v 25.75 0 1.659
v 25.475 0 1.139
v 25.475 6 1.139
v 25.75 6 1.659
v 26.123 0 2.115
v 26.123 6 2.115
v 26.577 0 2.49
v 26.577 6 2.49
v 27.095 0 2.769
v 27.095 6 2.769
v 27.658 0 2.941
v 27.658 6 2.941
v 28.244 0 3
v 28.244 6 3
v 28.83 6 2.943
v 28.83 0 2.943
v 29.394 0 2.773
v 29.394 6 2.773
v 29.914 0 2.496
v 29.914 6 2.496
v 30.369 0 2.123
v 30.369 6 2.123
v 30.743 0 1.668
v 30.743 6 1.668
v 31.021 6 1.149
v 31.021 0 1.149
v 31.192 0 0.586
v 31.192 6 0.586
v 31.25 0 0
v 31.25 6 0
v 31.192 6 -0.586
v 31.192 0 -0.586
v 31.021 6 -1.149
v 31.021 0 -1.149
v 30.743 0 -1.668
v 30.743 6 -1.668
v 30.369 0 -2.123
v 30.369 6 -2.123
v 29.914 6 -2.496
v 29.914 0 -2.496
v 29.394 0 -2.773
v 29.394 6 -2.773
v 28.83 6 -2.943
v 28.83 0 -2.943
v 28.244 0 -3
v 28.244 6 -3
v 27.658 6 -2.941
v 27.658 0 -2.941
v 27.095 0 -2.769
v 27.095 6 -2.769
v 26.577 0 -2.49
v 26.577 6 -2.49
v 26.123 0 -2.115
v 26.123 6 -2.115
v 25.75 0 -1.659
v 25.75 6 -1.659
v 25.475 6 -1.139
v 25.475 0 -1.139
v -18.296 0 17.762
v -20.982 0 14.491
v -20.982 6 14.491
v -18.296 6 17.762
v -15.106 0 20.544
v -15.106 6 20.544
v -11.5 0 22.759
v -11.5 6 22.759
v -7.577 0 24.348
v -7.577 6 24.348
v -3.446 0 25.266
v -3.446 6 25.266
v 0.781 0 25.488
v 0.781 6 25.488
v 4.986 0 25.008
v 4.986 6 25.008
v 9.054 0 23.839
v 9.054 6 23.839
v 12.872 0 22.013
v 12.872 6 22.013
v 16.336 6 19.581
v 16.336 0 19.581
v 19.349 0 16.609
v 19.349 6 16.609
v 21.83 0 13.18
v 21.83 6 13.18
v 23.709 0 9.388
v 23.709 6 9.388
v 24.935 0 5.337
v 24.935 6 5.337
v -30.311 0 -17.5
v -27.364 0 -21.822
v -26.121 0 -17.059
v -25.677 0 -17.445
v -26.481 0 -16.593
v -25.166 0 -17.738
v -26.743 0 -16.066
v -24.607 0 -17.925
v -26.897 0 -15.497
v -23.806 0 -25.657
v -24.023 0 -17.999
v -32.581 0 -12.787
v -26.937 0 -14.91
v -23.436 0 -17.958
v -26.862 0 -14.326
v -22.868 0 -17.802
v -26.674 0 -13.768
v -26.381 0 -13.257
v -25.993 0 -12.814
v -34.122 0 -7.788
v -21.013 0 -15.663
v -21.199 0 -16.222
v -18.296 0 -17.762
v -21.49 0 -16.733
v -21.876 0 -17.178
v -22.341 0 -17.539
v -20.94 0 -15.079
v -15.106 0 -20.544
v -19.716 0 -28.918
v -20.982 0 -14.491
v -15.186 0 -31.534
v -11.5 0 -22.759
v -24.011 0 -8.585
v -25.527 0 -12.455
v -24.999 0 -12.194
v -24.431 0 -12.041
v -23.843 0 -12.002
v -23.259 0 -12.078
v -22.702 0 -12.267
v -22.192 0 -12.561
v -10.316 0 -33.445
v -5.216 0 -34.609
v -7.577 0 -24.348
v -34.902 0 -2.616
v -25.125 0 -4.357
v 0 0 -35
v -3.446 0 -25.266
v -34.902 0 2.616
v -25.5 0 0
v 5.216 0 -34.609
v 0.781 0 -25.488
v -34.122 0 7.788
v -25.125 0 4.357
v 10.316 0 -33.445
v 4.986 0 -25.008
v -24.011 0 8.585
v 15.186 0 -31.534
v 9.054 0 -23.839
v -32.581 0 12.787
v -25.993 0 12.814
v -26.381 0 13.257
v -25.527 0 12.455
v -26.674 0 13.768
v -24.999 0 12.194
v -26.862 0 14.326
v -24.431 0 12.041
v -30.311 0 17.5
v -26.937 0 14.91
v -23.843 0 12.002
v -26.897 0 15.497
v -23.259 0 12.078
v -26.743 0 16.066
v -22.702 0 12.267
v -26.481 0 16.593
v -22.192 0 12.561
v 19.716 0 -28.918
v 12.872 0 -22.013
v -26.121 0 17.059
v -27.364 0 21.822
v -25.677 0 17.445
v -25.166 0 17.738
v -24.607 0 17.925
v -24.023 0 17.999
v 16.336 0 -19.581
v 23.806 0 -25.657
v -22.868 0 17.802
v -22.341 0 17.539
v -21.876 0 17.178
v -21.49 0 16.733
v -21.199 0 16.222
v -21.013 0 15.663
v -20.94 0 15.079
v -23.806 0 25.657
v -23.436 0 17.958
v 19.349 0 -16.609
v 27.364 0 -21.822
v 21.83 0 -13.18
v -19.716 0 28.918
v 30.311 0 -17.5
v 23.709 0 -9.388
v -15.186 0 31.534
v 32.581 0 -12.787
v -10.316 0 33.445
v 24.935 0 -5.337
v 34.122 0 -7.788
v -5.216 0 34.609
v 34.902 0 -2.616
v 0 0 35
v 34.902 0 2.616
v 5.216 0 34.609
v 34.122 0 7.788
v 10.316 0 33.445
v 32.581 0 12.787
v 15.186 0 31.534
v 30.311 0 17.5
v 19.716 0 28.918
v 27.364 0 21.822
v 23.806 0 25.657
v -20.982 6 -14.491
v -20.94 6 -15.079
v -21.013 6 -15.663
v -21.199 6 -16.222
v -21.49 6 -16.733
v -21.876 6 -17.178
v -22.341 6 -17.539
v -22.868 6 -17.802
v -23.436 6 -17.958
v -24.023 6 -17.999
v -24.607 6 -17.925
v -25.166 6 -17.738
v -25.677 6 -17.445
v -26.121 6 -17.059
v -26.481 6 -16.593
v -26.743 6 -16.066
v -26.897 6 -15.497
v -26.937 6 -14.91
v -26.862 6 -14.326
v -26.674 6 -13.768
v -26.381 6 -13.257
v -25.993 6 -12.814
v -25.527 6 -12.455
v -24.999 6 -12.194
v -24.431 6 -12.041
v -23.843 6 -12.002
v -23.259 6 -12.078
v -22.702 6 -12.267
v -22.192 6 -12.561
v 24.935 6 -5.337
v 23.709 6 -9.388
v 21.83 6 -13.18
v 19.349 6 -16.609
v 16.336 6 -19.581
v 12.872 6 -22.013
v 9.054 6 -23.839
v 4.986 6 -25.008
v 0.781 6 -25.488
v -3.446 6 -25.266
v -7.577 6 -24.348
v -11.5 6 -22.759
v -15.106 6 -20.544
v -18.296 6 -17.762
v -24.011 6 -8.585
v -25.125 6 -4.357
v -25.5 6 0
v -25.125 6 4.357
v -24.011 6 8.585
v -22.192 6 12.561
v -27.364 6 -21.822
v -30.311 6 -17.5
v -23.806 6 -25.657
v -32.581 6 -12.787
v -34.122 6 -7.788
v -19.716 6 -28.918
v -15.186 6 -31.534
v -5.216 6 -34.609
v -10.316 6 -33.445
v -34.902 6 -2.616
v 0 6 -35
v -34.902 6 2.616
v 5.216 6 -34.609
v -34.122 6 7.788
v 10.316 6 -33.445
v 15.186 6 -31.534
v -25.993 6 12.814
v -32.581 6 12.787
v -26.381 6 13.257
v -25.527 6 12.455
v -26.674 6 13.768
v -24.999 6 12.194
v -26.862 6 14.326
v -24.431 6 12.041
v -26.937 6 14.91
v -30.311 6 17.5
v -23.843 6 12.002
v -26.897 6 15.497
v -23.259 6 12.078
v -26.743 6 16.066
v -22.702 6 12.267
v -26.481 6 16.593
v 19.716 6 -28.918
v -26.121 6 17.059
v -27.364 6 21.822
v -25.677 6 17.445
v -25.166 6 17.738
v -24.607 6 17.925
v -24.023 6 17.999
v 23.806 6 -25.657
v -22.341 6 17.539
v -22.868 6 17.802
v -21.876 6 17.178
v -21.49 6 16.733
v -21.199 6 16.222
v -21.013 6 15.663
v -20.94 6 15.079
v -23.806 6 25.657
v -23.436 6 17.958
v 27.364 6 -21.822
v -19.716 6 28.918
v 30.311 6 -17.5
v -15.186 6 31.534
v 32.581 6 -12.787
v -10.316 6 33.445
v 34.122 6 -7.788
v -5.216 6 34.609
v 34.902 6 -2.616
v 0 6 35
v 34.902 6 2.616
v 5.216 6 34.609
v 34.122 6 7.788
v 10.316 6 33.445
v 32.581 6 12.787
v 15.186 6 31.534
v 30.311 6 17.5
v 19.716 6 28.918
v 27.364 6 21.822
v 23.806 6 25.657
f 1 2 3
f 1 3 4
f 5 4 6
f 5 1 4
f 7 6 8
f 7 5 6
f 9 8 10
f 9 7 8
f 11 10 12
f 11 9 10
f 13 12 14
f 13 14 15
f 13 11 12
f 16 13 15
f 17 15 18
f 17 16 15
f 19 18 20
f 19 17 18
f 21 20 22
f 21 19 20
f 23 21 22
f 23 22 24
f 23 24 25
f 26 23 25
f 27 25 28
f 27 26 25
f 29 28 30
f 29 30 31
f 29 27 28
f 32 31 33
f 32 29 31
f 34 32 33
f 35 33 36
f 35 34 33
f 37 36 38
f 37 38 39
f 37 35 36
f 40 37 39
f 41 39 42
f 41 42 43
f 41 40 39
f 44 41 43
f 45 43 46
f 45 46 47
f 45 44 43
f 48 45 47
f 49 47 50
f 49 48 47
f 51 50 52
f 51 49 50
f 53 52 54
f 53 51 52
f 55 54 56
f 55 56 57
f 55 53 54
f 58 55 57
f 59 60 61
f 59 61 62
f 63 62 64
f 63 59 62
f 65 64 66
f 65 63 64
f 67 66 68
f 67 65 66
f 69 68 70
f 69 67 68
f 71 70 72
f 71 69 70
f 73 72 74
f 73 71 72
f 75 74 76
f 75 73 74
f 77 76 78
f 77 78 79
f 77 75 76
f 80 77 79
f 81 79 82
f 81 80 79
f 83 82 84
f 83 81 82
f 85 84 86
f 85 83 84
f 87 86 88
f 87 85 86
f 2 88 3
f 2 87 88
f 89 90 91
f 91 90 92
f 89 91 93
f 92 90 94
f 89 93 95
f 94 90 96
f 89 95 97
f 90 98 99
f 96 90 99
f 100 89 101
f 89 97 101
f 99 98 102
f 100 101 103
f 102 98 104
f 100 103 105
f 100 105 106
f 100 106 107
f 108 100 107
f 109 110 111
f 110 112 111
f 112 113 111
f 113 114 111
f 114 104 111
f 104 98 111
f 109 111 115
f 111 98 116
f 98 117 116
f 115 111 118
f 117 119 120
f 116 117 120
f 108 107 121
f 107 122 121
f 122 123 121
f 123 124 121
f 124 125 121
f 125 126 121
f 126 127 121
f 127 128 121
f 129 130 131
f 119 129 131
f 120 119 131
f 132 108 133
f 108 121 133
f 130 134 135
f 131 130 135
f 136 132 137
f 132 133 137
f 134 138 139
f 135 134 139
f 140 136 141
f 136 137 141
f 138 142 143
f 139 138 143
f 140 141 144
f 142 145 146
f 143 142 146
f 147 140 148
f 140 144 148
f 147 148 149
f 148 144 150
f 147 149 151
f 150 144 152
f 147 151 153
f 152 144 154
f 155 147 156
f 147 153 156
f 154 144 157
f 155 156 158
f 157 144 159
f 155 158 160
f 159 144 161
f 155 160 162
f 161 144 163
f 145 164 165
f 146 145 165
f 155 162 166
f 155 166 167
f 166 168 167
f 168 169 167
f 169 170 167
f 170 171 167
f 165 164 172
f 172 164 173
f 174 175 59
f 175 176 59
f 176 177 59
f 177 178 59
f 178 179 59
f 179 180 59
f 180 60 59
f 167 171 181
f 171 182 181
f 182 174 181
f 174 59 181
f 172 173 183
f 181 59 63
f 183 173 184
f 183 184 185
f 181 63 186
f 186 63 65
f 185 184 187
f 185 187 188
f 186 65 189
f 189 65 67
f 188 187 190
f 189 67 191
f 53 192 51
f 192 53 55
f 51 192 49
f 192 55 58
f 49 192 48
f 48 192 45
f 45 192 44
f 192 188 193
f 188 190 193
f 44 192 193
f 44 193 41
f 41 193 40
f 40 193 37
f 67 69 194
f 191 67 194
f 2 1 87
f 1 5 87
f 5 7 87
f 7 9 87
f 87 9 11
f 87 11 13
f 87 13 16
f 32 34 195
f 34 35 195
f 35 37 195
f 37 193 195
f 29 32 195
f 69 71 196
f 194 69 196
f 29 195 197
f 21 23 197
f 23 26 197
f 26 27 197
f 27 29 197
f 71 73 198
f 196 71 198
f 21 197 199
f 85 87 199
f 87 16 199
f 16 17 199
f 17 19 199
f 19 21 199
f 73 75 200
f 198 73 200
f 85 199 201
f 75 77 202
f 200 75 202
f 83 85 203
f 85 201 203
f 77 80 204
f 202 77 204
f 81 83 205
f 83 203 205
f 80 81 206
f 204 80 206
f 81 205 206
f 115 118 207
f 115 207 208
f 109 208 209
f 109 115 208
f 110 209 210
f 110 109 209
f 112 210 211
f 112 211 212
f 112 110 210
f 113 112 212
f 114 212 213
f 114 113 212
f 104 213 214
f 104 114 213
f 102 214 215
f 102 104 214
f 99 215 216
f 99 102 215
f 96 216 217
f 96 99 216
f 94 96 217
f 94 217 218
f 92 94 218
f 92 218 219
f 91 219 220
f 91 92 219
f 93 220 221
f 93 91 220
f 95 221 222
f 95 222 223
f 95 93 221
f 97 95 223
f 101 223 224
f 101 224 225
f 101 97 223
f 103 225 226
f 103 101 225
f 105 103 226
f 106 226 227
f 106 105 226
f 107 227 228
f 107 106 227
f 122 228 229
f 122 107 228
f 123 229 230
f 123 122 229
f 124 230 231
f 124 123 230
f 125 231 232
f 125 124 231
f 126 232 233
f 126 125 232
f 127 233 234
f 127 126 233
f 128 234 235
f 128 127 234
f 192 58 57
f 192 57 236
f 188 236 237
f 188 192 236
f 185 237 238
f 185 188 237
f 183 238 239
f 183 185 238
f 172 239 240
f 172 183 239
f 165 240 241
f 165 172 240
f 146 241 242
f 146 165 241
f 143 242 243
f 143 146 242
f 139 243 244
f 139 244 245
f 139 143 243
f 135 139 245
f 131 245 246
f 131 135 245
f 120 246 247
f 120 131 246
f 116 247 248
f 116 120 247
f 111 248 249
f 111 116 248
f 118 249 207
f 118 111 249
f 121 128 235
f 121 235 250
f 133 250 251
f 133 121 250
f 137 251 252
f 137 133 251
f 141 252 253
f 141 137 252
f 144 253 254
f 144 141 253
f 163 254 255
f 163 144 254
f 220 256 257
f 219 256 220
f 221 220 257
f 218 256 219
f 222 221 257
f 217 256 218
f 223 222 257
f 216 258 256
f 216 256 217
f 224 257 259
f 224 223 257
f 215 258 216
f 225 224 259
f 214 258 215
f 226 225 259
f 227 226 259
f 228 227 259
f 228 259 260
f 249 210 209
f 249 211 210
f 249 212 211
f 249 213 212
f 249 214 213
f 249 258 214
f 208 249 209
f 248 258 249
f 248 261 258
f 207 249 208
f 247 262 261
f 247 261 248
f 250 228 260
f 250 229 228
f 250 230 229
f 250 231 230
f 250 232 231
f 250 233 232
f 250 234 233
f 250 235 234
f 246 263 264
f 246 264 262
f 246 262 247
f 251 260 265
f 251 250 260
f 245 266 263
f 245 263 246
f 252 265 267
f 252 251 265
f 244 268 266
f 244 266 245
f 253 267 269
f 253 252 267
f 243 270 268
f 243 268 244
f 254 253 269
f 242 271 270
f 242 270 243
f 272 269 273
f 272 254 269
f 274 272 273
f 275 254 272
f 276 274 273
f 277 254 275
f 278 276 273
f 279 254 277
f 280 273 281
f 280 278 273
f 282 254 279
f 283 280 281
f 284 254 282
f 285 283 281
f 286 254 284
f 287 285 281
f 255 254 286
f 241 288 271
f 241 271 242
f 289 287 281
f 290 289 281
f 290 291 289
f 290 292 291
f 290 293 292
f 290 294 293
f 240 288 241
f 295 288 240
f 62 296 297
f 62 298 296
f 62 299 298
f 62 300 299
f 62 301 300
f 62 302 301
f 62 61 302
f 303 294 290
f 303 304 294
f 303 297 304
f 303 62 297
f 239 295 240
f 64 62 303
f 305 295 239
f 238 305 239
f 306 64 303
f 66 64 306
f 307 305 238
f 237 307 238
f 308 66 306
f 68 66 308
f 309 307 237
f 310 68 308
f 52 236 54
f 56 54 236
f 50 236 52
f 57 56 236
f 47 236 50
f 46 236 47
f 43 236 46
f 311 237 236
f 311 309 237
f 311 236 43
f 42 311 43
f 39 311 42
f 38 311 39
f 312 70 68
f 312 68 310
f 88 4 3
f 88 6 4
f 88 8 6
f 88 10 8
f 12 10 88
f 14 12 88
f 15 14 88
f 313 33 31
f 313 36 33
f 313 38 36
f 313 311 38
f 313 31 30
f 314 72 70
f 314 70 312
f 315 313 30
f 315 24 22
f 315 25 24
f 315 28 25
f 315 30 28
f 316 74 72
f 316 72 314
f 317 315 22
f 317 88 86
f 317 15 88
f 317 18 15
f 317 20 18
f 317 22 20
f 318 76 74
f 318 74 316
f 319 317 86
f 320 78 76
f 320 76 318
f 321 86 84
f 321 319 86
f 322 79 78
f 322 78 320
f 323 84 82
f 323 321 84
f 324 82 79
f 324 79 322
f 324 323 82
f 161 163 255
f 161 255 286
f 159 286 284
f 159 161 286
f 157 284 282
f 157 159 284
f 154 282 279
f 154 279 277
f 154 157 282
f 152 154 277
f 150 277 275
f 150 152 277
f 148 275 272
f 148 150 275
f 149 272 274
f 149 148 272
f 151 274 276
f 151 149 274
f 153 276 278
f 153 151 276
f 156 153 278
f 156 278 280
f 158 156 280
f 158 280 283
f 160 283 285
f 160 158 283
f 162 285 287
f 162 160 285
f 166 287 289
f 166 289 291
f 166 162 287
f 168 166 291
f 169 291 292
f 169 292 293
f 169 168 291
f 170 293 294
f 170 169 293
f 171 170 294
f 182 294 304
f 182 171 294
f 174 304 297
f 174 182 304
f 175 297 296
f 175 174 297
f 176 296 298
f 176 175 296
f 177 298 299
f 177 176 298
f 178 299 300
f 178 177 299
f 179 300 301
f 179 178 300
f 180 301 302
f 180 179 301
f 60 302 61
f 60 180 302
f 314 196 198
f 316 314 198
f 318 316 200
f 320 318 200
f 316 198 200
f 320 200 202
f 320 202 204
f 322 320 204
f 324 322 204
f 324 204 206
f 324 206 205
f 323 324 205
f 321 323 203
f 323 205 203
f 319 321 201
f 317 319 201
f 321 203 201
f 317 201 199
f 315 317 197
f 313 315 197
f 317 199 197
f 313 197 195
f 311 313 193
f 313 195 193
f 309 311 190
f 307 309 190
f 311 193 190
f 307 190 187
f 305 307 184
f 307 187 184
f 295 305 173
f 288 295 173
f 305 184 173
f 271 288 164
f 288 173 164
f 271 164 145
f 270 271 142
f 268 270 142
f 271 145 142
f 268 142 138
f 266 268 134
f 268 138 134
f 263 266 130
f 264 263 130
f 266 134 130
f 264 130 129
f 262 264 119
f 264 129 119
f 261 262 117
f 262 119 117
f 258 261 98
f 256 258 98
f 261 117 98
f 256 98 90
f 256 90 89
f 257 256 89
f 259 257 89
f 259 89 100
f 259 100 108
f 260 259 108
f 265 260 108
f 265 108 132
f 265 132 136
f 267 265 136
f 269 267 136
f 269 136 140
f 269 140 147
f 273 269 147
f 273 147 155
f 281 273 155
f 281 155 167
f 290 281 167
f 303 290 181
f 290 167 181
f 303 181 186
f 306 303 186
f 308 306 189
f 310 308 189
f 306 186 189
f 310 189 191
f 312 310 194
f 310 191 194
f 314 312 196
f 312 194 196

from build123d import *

# Parameters (mm, degrees)
SKETCH_1_R      = 35
EXTRUDE_1_DEPTH = 6


with BuildPart() as part:
    # 草图1 → 凸台-拉伸1 (new body)
    with BuildSketch(Plane(origin=(0, 0, 0), x_dir=(1, 0, 0), z_dir=(0, 1, 0))):
        with Locations(Location((0, 0, 0), (0, 0, 270))):
            Circle(SKETCH_1_R)
        with BuildLine():
            ThreePointArc((-20.982160881, 14.491339648), (-26.480889225, 16.592920354), (-22.19153101, 12.561287809))
            ThreePointArc((-22.19153101, 12.561287809), (-25.5, 0), (-22.19153101, -12.561287809))
            ThreePointArc((-22.19153101, -12.561287809), (-26.480889225, -16.592920354), (-20.982160881, -14.491339648))
            ThreePointArc((-20.982160881, -14.491339648), (7.04399237, -24.507798177), (25.474557522, -1.138823539))
            ThreePointArc((25.474557522, -1.138823539), (31.25, 0), (25.474557522, 1.138823539))
            ThreePointArc((25.474557522, 1.138823539), (7.04399237, 24.507798177), (-20.982160881, 14.491339648))
        make_face(mode=Mode.SUBTRACT)
    extrude(amount=EXTRUDE_1_DEPTH)


solid = part.part
